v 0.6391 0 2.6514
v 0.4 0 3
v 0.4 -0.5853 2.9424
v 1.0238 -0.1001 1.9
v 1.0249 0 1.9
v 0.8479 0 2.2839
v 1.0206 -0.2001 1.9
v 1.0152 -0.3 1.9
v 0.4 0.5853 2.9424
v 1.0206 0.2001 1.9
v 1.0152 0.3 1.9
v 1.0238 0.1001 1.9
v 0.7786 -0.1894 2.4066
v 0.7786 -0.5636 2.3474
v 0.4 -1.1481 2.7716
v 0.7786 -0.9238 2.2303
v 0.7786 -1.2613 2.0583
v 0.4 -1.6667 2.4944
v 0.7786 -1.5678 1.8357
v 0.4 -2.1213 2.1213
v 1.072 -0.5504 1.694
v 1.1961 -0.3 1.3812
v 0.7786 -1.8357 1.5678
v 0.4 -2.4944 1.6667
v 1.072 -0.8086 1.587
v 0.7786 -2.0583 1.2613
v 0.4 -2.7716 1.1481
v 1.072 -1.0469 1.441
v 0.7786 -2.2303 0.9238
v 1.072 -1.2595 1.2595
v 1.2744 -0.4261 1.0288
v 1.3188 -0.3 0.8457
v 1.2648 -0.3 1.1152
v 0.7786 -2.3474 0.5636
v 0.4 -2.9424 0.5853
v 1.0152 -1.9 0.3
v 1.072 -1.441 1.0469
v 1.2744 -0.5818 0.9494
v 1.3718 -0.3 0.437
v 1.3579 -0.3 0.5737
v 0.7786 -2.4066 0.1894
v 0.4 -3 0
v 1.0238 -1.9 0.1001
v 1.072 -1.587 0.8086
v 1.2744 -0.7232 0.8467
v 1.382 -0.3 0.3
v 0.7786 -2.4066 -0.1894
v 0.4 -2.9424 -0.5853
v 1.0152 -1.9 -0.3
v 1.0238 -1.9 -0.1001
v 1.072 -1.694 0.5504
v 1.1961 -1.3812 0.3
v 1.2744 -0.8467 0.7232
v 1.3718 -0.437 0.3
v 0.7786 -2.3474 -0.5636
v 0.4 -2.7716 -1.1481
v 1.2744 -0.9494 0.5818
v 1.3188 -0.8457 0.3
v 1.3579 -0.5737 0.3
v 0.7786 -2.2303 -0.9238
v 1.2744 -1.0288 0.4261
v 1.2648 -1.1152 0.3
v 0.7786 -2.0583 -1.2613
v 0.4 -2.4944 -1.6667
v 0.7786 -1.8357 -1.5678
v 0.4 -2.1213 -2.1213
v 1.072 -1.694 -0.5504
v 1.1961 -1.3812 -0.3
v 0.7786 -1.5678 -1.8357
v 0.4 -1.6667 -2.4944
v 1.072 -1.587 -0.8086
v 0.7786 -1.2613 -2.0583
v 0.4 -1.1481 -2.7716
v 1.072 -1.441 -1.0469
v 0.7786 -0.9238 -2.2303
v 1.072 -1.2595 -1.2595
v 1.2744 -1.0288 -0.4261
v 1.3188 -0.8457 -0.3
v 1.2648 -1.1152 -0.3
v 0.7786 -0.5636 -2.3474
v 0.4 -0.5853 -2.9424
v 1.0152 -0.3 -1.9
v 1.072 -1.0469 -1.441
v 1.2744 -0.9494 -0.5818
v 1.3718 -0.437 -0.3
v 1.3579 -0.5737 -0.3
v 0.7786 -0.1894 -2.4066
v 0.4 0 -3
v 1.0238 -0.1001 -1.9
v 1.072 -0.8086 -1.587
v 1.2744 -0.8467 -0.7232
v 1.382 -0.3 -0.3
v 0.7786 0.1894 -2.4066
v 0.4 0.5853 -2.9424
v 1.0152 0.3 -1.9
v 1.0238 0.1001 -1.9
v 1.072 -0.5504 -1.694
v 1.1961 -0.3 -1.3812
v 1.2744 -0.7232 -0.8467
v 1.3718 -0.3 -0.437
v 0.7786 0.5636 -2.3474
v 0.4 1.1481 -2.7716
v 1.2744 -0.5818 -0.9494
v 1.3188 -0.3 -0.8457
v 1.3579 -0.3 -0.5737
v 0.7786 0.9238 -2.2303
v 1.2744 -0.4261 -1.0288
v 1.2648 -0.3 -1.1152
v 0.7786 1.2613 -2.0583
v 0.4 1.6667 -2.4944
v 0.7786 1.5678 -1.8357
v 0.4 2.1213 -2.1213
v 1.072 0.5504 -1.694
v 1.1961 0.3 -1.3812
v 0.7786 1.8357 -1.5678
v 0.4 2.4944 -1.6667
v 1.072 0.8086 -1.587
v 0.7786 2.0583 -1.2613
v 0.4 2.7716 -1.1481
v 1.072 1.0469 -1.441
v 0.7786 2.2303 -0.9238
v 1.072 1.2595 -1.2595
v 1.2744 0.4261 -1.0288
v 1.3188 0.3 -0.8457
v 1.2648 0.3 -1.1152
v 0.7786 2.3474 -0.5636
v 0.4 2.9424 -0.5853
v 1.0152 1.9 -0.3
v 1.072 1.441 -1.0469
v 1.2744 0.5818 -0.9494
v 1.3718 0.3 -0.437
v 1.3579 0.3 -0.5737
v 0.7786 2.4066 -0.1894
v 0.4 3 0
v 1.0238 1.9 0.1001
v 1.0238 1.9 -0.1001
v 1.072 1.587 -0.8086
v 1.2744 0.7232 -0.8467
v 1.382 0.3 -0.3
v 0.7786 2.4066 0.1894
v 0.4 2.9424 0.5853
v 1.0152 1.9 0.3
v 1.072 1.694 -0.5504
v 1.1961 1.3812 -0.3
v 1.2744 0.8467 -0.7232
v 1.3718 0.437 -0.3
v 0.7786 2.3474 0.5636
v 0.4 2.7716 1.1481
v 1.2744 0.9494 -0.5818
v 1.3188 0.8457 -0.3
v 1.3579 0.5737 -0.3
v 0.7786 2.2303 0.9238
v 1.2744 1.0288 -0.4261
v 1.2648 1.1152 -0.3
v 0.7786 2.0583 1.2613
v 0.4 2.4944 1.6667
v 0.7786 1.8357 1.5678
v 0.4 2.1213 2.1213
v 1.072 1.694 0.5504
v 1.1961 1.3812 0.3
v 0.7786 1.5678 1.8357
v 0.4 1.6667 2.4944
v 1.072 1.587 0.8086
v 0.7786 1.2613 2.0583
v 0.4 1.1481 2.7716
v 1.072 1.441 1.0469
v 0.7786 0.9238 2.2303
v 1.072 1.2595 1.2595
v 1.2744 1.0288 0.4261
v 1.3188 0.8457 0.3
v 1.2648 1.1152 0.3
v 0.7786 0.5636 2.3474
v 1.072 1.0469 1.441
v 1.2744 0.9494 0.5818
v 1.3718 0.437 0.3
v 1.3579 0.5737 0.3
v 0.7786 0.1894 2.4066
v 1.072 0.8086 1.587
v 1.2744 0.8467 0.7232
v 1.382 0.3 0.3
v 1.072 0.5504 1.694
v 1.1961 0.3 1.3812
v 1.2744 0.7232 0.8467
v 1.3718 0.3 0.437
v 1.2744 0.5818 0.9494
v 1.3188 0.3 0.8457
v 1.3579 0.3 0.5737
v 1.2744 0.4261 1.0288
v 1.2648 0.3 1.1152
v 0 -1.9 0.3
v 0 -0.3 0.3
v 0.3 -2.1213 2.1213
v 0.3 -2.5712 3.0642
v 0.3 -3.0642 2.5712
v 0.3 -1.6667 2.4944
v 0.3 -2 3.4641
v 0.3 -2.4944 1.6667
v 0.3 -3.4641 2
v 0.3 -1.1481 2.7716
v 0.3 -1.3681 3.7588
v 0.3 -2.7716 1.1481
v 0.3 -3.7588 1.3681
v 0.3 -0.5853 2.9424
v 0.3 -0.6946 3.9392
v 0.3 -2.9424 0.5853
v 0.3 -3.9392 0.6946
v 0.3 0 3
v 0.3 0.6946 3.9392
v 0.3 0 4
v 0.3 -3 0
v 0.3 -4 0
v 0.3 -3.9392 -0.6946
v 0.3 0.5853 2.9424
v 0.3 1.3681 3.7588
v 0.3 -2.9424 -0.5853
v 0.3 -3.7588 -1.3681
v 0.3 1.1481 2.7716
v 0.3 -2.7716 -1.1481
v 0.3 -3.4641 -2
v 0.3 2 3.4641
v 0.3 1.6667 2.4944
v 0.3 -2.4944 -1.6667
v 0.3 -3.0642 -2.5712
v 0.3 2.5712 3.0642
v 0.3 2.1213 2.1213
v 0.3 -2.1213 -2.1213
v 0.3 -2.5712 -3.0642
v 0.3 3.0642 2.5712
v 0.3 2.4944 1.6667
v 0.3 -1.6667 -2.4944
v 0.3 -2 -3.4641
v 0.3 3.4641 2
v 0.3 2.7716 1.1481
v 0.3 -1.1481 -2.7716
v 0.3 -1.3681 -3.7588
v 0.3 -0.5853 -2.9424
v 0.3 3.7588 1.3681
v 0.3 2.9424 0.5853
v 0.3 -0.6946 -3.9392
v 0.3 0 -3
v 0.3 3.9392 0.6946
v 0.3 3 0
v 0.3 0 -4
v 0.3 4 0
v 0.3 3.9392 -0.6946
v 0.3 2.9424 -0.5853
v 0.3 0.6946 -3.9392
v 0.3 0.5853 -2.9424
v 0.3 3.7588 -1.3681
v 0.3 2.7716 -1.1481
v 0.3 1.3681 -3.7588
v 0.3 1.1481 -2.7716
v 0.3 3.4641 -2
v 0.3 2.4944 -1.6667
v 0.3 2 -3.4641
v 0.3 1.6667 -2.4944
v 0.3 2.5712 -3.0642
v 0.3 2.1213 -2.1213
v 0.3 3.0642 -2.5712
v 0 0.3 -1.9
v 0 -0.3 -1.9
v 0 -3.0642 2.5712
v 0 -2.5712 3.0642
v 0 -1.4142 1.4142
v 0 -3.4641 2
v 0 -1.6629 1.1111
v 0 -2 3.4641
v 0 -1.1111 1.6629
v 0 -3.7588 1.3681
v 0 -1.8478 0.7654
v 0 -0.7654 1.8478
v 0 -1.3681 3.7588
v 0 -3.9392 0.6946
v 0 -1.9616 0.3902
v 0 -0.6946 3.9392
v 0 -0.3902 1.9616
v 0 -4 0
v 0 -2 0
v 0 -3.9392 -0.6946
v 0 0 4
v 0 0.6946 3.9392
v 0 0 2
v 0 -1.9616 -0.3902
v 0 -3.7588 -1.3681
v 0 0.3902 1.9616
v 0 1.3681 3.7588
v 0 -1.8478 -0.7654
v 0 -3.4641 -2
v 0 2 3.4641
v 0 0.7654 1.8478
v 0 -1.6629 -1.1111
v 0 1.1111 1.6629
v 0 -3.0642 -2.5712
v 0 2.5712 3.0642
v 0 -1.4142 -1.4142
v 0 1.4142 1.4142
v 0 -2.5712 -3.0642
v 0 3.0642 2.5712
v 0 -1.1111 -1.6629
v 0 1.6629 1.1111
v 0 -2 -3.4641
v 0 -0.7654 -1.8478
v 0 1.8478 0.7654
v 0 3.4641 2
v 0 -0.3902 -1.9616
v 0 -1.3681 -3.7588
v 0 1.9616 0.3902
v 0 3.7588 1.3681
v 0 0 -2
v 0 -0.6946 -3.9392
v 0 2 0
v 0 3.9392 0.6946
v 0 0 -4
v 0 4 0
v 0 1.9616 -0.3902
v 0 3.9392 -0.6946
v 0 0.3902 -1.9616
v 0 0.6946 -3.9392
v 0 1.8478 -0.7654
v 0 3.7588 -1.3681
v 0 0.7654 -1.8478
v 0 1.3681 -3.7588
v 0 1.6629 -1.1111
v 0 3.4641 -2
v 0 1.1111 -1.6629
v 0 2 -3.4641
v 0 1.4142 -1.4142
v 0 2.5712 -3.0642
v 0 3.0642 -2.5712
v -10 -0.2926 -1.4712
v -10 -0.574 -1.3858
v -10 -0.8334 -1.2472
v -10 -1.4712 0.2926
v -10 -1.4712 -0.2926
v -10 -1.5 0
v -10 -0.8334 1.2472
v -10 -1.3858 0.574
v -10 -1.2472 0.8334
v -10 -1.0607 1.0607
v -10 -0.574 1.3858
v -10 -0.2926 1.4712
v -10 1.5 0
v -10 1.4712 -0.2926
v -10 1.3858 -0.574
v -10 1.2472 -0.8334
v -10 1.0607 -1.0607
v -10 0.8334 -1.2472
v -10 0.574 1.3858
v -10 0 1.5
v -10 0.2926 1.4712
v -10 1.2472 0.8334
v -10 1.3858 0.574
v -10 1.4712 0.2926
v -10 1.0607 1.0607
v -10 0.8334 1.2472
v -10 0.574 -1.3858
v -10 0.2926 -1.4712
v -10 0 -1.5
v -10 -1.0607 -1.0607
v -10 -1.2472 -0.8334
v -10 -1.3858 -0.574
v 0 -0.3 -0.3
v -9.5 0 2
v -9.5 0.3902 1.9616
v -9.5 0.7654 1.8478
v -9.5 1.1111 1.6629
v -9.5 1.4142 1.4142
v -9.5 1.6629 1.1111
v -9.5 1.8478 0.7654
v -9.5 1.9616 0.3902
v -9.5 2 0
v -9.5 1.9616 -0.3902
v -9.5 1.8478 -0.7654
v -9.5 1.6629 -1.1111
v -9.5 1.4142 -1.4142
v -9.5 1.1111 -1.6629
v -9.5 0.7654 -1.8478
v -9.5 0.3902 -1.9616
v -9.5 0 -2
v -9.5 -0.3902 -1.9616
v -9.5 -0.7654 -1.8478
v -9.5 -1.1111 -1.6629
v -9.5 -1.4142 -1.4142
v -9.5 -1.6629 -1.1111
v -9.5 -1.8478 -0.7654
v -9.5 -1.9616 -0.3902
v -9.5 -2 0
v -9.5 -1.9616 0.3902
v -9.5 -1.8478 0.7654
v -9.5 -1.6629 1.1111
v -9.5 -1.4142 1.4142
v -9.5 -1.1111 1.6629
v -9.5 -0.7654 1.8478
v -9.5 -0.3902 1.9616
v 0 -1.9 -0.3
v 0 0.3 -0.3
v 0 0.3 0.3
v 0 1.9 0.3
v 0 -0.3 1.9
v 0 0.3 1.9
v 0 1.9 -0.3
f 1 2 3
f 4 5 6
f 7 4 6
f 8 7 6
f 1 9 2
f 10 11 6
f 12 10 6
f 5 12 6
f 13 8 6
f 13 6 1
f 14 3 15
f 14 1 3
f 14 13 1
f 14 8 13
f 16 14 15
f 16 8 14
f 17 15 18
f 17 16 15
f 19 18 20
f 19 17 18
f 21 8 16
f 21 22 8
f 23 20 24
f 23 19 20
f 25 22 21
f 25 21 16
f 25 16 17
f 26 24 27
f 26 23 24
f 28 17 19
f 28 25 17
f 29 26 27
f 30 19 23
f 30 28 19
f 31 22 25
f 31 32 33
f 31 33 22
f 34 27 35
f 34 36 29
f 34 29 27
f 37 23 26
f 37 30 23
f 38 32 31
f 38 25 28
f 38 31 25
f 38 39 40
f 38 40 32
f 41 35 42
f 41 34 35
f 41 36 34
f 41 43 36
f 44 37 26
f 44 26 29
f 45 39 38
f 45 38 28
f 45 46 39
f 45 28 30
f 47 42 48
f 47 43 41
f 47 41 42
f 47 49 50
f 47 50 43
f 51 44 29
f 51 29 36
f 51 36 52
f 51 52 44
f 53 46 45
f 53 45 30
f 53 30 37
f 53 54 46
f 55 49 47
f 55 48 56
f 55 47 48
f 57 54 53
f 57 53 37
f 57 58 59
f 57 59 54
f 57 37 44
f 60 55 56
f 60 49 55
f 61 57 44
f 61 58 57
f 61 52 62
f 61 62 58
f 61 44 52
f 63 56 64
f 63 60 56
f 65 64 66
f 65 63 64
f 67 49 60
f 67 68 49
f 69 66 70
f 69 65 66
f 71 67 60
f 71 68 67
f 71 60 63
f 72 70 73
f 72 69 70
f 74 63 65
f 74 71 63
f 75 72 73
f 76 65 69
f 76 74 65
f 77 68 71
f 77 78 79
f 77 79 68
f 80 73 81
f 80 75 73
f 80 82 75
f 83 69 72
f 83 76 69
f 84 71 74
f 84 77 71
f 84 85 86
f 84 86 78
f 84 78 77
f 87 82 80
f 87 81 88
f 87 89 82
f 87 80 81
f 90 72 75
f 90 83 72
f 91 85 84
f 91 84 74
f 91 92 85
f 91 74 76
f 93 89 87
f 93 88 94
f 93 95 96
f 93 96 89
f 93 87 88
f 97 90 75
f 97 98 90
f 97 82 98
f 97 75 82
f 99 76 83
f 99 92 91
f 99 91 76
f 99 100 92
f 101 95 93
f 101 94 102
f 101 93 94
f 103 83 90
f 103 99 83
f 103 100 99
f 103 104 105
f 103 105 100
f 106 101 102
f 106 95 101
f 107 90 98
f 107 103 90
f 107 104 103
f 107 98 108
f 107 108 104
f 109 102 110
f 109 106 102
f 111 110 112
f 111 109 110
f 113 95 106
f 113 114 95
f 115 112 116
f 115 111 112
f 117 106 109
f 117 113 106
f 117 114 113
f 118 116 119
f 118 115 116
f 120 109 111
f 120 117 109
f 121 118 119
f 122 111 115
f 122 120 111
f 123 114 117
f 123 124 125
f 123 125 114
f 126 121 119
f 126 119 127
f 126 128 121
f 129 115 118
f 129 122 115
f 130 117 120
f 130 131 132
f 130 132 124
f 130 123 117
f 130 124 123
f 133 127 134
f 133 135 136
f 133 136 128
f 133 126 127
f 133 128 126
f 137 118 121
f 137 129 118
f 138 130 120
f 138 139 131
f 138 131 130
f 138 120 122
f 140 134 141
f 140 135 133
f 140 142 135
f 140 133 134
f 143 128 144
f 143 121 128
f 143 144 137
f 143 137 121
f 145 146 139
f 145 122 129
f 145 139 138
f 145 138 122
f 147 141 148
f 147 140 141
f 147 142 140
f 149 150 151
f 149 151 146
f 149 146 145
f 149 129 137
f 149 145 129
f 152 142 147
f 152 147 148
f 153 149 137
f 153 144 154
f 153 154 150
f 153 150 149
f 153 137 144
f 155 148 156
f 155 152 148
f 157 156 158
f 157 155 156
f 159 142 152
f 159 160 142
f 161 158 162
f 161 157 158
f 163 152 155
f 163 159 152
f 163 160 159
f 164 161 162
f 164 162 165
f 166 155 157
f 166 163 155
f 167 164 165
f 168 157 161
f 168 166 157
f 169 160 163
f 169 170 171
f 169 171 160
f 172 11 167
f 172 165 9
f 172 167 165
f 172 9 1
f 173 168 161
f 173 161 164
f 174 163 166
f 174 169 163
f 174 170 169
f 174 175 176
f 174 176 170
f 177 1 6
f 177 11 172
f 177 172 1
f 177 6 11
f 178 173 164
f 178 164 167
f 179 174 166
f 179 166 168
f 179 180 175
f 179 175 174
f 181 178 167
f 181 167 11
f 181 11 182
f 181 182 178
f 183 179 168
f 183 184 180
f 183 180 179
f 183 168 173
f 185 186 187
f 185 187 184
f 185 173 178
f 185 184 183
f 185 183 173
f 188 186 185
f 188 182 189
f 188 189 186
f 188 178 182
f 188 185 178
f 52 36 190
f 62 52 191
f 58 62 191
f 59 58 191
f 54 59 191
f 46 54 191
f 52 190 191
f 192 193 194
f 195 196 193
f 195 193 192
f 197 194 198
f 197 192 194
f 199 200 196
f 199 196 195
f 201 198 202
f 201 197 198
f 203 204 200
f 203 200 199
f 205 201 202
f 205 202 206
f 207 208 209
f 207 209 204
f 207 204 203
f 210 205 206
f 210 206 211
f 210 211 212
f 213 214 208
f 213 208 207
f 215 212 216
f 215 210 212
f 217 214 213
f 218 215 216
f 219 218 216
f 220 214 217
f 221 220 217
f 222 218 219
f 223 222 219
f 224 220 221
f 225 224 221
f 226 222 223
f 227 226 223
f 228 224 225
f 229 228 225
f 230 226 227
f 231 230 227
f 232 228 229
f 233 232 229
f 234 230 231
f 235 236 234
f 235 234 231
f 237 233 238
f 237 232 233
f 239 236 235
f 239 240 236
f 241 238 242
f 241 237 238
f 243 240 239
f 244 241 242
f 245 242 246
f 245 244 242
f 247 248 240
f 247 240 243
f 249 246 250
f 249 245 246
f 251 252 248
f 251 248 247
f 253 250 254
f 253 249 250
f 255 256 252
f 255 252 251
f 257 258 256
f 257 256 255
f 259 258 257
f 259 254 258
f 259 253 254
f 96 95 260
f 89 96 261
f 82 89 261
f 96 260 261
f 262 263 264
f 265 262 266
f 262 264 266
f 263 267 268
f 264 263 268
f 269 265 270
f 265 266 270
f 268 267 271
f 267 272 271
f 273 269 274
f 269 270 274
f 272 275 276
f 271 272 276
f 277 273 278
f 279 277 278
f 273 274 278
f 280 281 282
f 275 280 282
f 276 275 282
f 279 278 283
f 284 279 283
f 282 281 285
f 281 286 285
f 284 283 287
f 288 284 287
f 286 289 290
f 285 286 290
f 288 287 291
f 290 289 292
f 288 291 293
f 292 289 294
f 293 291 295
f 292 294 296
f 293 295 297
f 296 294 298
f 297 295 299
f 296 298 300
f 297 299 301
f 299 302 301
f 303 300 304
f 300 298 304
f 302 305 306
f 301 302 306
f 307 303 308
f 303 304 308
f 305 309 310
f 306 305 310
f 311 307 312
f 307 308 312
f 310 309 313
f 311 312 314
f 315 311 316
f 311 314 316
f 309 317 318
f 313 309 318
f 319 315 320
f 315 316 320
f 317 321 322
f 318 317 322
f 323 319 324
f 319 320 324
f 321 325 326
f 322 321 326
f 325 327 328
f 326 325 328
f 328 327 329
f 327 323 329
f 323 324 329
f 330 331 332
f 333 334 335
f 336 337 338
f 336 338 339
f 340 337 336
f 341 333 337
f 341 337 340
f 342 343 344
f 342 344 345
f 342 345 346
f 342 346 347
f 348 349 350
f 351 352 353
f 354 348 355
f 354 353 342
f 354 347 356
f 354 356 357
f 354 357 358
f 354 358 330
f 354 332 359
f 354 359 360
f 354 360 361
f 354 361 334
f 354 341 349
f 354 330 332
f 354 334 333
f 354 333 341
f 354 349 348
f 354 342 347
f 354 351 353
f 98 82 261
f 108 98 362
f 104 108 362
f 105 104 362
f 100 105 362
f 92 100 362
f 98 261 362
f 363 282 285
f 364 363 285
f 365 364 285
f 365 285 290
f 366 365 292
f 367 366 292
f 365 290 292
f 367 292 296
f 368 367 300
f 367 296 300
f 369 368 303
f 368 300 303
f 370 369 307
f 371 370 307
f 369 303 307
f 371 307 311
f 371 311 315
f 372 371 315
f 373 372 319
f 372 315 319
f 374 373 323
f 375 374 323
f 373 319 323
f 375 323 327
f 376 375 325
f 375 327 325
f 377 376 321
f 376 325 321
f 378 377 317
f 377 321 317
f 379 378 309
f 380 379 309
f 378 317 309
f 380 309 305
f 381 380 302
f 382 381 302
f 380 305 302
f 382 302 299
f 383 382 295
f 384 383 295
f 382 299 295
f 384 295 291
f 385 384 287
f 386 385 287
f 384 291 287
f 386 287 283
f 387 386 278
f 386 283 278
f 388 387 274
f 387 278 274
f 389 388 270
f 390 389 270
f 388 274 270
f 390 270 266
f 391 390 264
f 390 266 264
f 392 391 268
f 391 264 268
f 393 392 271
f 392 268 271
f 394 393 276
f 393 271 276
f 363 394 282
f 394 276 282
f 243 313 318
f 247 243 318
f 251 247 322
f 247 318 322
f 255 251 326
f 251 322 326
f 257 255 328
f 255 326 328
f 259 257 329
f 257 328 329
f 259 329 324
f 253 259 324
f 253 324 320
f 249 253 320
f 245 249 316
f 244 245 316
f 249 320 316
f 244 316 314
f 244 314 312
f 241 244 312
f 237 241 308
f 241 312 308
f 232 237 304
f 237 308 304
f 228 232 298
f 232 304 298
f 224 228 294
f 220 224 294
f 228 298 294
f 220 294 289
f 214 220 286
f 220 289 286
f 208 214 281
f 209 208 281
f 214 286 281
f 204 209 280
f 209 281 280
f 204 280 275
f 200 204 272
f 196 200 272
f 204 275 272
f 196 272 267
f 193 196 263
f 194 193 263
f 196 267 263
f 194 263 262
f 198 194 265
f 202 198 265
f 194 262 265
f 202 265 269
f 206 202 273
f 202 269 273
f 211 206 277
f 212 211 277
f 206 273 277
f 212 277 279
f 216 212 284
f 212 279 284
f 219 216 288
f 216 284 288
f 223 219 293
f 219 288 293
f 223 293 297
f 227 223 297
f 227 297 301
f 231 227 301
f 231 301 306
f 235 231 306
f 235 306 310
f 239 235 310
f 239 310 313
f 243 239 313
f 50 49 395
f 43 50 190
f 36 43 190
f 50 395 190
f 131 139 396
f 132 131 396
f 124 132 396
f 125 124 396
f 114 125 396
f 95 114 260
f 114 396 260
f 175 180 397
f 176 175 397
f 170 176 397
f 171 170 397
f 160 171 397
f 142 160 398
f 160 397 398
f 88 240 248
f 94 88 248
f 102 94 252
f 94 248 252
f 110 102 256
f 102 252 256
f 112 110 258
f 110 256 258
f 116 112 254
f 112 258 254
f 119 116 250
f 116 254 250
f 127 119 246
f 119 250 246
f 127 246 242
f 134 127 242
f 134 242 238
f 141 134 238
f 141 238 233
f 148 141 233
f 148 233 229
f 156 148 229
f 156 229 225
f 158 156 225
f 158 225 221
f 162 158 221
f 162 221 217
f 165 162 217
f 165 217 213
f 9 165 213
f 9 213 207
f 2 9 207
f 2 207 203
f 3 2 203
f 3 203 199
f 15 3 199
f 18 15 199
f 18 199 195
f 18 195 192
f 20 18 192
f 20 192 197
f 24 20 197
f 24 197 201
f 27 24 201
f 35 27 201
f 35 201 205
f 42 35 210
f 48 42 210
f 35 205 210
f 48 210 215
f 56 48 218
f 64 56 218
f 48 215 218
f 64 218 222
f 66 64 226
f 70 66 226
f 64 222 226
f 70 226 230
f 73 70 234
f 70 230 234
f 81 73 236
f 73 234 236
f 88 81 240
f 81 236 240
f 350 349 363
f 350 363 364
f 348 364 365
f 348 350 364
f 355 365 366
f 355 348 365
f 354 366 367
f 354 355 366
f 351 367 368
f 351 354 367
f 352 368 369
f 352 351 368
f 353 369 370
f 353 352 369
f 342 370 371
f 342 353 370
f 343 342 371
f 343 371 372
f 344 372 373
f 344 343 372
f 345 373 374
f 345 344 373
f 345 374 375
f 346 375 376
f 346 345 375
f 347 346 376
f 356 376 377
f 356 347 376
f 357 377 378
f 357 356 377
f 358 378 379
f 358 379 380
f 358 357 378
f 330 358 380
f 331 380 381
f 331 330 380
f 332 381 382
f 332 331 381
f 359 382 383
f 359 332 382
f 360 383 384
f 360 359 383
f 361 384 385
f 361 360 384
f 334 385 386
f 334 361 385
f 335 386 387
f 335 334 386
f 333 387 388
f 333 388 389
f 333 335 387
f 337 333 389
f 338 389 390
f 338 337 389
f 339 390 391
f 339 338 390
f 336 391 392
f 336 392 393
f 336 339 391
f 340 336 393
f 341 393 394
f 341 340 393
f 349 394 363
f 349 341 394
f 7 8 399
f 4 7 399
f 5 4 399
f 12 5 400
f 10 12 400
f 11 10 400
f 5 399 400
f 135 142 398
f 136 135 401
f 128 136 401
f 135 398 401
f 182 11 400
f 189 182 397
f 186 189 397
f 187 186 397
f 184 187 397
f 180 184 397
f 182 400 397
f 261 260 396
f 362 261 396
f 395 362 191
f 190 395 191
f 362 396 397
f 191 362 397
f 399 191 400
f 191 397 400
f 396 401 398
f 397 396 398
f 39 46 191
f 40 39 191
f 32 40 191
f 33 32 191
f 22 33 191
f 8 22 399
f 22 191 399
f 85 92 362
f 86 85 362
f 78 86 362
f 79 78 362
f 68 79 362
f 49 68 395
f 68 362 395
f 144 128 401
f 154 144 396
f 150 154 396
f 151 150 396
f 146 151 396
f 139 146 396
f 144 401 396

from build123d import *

# Parameters (mm, degrees)
SKETCH_1_R          = 4
EXTRUDE_1_DEPTH     = 0.3
SKETCH_2_R          = 2
EXTRUDE_3_DEPTH     = 10
SKETCH_6_R          = 3
EXTRUDE_4_DEPTH     = 0.1
DOME_1_FACE_RADIUS  = 3
DOME_1_HEIGHT       = 1
CUT_EXTRUDE_2_DEPTH = 3
CHAMFER_1_SIZE      = 0.5


with BuildPart() as part:
    # 草图1 → 凸台-拉伸1 (new body)
    with BuildSketch(Plane(origin=(0, 0, 0), x_dir=(0, 0, -1), z_dir=(1, 0, 0))):
        Circle(SKETCH_1_R)
    extrude(amount=EXTRUDE_1_DEPTH)

    # 草图2 → 凸台-拉伸3 (add)
    with BuildSketch(Plane.ZY):
        Circle(SKETCH_2_R)
    extrude(amount=EXTRUDE_3_DEPTH)

    # 草图6 → 凸台-拉伸4 (add)
    with BuildSketch(Plane(origin=(0.3, 0, 0), x_dir=(0, 0, -1), z_dir=(1, 0, 0))):
        Circle(SKETCH_6_R)
    extrude(amount=EXTRUDE_4_DEPTH)

    # 圆顶1: a dome of height H over a round flat face of radius A is a cap of a sphere of radius (A * A + H * H) / (2 * H)
    dome_1_r = (DOME_1_FACE_RADIUS * DOME_1_FACE_RADIUS + DOME_1_HEIGHT * DOME_1_HEIGHT) / (2 * DOME_1_HEIGHT)
    dome_1_base = Plane((0.4, 0, 0), z_dir=(1, 0, 0))
    with Locations(dome_1_base.offset(DOME_1_HEIGHT - dome_1_r)):
        dome_1_ball = Sphere(dome_1_r, mode=Mode.PRIVATE)
    add(split(dome_1_ball, bisect_by=dome_1_base, keep=Keep.TOP, mode=Mode.PRIVATE))

    # 草图5 → 切除-拉伸2 (cut)
    with BuildSketch(Plane(origin=(0, 0, 0), x_dir=(0, 0, -1), z_dir=(1, 0, 0))):
        Polygon((0.3, 0.3), (1.9, 0.3), (1.9, -0.3), (0.3, -0.3), (0.3, -1.9), (-0.3, -1.9), (-0.3, -0.3), (-1.9, -0.3), (-1.9, 0.3), (-0.3, 0.3), (-0.3, 1.9), (0.3, 1.9), align=None)
    extrude(amount=CUT_EXTRUDE_2_DEPTH, mode=Mode.SUBTRACT)

    # 倒角1
    chamfer_1_edges = [part.edges().sort_by_distance(p)[0] for p in [
        (-10, 0, -2),
    ]]
    chamfer(chamfer_1_edges, length=CHAMFER_1_SIZE)


solid = part.part
